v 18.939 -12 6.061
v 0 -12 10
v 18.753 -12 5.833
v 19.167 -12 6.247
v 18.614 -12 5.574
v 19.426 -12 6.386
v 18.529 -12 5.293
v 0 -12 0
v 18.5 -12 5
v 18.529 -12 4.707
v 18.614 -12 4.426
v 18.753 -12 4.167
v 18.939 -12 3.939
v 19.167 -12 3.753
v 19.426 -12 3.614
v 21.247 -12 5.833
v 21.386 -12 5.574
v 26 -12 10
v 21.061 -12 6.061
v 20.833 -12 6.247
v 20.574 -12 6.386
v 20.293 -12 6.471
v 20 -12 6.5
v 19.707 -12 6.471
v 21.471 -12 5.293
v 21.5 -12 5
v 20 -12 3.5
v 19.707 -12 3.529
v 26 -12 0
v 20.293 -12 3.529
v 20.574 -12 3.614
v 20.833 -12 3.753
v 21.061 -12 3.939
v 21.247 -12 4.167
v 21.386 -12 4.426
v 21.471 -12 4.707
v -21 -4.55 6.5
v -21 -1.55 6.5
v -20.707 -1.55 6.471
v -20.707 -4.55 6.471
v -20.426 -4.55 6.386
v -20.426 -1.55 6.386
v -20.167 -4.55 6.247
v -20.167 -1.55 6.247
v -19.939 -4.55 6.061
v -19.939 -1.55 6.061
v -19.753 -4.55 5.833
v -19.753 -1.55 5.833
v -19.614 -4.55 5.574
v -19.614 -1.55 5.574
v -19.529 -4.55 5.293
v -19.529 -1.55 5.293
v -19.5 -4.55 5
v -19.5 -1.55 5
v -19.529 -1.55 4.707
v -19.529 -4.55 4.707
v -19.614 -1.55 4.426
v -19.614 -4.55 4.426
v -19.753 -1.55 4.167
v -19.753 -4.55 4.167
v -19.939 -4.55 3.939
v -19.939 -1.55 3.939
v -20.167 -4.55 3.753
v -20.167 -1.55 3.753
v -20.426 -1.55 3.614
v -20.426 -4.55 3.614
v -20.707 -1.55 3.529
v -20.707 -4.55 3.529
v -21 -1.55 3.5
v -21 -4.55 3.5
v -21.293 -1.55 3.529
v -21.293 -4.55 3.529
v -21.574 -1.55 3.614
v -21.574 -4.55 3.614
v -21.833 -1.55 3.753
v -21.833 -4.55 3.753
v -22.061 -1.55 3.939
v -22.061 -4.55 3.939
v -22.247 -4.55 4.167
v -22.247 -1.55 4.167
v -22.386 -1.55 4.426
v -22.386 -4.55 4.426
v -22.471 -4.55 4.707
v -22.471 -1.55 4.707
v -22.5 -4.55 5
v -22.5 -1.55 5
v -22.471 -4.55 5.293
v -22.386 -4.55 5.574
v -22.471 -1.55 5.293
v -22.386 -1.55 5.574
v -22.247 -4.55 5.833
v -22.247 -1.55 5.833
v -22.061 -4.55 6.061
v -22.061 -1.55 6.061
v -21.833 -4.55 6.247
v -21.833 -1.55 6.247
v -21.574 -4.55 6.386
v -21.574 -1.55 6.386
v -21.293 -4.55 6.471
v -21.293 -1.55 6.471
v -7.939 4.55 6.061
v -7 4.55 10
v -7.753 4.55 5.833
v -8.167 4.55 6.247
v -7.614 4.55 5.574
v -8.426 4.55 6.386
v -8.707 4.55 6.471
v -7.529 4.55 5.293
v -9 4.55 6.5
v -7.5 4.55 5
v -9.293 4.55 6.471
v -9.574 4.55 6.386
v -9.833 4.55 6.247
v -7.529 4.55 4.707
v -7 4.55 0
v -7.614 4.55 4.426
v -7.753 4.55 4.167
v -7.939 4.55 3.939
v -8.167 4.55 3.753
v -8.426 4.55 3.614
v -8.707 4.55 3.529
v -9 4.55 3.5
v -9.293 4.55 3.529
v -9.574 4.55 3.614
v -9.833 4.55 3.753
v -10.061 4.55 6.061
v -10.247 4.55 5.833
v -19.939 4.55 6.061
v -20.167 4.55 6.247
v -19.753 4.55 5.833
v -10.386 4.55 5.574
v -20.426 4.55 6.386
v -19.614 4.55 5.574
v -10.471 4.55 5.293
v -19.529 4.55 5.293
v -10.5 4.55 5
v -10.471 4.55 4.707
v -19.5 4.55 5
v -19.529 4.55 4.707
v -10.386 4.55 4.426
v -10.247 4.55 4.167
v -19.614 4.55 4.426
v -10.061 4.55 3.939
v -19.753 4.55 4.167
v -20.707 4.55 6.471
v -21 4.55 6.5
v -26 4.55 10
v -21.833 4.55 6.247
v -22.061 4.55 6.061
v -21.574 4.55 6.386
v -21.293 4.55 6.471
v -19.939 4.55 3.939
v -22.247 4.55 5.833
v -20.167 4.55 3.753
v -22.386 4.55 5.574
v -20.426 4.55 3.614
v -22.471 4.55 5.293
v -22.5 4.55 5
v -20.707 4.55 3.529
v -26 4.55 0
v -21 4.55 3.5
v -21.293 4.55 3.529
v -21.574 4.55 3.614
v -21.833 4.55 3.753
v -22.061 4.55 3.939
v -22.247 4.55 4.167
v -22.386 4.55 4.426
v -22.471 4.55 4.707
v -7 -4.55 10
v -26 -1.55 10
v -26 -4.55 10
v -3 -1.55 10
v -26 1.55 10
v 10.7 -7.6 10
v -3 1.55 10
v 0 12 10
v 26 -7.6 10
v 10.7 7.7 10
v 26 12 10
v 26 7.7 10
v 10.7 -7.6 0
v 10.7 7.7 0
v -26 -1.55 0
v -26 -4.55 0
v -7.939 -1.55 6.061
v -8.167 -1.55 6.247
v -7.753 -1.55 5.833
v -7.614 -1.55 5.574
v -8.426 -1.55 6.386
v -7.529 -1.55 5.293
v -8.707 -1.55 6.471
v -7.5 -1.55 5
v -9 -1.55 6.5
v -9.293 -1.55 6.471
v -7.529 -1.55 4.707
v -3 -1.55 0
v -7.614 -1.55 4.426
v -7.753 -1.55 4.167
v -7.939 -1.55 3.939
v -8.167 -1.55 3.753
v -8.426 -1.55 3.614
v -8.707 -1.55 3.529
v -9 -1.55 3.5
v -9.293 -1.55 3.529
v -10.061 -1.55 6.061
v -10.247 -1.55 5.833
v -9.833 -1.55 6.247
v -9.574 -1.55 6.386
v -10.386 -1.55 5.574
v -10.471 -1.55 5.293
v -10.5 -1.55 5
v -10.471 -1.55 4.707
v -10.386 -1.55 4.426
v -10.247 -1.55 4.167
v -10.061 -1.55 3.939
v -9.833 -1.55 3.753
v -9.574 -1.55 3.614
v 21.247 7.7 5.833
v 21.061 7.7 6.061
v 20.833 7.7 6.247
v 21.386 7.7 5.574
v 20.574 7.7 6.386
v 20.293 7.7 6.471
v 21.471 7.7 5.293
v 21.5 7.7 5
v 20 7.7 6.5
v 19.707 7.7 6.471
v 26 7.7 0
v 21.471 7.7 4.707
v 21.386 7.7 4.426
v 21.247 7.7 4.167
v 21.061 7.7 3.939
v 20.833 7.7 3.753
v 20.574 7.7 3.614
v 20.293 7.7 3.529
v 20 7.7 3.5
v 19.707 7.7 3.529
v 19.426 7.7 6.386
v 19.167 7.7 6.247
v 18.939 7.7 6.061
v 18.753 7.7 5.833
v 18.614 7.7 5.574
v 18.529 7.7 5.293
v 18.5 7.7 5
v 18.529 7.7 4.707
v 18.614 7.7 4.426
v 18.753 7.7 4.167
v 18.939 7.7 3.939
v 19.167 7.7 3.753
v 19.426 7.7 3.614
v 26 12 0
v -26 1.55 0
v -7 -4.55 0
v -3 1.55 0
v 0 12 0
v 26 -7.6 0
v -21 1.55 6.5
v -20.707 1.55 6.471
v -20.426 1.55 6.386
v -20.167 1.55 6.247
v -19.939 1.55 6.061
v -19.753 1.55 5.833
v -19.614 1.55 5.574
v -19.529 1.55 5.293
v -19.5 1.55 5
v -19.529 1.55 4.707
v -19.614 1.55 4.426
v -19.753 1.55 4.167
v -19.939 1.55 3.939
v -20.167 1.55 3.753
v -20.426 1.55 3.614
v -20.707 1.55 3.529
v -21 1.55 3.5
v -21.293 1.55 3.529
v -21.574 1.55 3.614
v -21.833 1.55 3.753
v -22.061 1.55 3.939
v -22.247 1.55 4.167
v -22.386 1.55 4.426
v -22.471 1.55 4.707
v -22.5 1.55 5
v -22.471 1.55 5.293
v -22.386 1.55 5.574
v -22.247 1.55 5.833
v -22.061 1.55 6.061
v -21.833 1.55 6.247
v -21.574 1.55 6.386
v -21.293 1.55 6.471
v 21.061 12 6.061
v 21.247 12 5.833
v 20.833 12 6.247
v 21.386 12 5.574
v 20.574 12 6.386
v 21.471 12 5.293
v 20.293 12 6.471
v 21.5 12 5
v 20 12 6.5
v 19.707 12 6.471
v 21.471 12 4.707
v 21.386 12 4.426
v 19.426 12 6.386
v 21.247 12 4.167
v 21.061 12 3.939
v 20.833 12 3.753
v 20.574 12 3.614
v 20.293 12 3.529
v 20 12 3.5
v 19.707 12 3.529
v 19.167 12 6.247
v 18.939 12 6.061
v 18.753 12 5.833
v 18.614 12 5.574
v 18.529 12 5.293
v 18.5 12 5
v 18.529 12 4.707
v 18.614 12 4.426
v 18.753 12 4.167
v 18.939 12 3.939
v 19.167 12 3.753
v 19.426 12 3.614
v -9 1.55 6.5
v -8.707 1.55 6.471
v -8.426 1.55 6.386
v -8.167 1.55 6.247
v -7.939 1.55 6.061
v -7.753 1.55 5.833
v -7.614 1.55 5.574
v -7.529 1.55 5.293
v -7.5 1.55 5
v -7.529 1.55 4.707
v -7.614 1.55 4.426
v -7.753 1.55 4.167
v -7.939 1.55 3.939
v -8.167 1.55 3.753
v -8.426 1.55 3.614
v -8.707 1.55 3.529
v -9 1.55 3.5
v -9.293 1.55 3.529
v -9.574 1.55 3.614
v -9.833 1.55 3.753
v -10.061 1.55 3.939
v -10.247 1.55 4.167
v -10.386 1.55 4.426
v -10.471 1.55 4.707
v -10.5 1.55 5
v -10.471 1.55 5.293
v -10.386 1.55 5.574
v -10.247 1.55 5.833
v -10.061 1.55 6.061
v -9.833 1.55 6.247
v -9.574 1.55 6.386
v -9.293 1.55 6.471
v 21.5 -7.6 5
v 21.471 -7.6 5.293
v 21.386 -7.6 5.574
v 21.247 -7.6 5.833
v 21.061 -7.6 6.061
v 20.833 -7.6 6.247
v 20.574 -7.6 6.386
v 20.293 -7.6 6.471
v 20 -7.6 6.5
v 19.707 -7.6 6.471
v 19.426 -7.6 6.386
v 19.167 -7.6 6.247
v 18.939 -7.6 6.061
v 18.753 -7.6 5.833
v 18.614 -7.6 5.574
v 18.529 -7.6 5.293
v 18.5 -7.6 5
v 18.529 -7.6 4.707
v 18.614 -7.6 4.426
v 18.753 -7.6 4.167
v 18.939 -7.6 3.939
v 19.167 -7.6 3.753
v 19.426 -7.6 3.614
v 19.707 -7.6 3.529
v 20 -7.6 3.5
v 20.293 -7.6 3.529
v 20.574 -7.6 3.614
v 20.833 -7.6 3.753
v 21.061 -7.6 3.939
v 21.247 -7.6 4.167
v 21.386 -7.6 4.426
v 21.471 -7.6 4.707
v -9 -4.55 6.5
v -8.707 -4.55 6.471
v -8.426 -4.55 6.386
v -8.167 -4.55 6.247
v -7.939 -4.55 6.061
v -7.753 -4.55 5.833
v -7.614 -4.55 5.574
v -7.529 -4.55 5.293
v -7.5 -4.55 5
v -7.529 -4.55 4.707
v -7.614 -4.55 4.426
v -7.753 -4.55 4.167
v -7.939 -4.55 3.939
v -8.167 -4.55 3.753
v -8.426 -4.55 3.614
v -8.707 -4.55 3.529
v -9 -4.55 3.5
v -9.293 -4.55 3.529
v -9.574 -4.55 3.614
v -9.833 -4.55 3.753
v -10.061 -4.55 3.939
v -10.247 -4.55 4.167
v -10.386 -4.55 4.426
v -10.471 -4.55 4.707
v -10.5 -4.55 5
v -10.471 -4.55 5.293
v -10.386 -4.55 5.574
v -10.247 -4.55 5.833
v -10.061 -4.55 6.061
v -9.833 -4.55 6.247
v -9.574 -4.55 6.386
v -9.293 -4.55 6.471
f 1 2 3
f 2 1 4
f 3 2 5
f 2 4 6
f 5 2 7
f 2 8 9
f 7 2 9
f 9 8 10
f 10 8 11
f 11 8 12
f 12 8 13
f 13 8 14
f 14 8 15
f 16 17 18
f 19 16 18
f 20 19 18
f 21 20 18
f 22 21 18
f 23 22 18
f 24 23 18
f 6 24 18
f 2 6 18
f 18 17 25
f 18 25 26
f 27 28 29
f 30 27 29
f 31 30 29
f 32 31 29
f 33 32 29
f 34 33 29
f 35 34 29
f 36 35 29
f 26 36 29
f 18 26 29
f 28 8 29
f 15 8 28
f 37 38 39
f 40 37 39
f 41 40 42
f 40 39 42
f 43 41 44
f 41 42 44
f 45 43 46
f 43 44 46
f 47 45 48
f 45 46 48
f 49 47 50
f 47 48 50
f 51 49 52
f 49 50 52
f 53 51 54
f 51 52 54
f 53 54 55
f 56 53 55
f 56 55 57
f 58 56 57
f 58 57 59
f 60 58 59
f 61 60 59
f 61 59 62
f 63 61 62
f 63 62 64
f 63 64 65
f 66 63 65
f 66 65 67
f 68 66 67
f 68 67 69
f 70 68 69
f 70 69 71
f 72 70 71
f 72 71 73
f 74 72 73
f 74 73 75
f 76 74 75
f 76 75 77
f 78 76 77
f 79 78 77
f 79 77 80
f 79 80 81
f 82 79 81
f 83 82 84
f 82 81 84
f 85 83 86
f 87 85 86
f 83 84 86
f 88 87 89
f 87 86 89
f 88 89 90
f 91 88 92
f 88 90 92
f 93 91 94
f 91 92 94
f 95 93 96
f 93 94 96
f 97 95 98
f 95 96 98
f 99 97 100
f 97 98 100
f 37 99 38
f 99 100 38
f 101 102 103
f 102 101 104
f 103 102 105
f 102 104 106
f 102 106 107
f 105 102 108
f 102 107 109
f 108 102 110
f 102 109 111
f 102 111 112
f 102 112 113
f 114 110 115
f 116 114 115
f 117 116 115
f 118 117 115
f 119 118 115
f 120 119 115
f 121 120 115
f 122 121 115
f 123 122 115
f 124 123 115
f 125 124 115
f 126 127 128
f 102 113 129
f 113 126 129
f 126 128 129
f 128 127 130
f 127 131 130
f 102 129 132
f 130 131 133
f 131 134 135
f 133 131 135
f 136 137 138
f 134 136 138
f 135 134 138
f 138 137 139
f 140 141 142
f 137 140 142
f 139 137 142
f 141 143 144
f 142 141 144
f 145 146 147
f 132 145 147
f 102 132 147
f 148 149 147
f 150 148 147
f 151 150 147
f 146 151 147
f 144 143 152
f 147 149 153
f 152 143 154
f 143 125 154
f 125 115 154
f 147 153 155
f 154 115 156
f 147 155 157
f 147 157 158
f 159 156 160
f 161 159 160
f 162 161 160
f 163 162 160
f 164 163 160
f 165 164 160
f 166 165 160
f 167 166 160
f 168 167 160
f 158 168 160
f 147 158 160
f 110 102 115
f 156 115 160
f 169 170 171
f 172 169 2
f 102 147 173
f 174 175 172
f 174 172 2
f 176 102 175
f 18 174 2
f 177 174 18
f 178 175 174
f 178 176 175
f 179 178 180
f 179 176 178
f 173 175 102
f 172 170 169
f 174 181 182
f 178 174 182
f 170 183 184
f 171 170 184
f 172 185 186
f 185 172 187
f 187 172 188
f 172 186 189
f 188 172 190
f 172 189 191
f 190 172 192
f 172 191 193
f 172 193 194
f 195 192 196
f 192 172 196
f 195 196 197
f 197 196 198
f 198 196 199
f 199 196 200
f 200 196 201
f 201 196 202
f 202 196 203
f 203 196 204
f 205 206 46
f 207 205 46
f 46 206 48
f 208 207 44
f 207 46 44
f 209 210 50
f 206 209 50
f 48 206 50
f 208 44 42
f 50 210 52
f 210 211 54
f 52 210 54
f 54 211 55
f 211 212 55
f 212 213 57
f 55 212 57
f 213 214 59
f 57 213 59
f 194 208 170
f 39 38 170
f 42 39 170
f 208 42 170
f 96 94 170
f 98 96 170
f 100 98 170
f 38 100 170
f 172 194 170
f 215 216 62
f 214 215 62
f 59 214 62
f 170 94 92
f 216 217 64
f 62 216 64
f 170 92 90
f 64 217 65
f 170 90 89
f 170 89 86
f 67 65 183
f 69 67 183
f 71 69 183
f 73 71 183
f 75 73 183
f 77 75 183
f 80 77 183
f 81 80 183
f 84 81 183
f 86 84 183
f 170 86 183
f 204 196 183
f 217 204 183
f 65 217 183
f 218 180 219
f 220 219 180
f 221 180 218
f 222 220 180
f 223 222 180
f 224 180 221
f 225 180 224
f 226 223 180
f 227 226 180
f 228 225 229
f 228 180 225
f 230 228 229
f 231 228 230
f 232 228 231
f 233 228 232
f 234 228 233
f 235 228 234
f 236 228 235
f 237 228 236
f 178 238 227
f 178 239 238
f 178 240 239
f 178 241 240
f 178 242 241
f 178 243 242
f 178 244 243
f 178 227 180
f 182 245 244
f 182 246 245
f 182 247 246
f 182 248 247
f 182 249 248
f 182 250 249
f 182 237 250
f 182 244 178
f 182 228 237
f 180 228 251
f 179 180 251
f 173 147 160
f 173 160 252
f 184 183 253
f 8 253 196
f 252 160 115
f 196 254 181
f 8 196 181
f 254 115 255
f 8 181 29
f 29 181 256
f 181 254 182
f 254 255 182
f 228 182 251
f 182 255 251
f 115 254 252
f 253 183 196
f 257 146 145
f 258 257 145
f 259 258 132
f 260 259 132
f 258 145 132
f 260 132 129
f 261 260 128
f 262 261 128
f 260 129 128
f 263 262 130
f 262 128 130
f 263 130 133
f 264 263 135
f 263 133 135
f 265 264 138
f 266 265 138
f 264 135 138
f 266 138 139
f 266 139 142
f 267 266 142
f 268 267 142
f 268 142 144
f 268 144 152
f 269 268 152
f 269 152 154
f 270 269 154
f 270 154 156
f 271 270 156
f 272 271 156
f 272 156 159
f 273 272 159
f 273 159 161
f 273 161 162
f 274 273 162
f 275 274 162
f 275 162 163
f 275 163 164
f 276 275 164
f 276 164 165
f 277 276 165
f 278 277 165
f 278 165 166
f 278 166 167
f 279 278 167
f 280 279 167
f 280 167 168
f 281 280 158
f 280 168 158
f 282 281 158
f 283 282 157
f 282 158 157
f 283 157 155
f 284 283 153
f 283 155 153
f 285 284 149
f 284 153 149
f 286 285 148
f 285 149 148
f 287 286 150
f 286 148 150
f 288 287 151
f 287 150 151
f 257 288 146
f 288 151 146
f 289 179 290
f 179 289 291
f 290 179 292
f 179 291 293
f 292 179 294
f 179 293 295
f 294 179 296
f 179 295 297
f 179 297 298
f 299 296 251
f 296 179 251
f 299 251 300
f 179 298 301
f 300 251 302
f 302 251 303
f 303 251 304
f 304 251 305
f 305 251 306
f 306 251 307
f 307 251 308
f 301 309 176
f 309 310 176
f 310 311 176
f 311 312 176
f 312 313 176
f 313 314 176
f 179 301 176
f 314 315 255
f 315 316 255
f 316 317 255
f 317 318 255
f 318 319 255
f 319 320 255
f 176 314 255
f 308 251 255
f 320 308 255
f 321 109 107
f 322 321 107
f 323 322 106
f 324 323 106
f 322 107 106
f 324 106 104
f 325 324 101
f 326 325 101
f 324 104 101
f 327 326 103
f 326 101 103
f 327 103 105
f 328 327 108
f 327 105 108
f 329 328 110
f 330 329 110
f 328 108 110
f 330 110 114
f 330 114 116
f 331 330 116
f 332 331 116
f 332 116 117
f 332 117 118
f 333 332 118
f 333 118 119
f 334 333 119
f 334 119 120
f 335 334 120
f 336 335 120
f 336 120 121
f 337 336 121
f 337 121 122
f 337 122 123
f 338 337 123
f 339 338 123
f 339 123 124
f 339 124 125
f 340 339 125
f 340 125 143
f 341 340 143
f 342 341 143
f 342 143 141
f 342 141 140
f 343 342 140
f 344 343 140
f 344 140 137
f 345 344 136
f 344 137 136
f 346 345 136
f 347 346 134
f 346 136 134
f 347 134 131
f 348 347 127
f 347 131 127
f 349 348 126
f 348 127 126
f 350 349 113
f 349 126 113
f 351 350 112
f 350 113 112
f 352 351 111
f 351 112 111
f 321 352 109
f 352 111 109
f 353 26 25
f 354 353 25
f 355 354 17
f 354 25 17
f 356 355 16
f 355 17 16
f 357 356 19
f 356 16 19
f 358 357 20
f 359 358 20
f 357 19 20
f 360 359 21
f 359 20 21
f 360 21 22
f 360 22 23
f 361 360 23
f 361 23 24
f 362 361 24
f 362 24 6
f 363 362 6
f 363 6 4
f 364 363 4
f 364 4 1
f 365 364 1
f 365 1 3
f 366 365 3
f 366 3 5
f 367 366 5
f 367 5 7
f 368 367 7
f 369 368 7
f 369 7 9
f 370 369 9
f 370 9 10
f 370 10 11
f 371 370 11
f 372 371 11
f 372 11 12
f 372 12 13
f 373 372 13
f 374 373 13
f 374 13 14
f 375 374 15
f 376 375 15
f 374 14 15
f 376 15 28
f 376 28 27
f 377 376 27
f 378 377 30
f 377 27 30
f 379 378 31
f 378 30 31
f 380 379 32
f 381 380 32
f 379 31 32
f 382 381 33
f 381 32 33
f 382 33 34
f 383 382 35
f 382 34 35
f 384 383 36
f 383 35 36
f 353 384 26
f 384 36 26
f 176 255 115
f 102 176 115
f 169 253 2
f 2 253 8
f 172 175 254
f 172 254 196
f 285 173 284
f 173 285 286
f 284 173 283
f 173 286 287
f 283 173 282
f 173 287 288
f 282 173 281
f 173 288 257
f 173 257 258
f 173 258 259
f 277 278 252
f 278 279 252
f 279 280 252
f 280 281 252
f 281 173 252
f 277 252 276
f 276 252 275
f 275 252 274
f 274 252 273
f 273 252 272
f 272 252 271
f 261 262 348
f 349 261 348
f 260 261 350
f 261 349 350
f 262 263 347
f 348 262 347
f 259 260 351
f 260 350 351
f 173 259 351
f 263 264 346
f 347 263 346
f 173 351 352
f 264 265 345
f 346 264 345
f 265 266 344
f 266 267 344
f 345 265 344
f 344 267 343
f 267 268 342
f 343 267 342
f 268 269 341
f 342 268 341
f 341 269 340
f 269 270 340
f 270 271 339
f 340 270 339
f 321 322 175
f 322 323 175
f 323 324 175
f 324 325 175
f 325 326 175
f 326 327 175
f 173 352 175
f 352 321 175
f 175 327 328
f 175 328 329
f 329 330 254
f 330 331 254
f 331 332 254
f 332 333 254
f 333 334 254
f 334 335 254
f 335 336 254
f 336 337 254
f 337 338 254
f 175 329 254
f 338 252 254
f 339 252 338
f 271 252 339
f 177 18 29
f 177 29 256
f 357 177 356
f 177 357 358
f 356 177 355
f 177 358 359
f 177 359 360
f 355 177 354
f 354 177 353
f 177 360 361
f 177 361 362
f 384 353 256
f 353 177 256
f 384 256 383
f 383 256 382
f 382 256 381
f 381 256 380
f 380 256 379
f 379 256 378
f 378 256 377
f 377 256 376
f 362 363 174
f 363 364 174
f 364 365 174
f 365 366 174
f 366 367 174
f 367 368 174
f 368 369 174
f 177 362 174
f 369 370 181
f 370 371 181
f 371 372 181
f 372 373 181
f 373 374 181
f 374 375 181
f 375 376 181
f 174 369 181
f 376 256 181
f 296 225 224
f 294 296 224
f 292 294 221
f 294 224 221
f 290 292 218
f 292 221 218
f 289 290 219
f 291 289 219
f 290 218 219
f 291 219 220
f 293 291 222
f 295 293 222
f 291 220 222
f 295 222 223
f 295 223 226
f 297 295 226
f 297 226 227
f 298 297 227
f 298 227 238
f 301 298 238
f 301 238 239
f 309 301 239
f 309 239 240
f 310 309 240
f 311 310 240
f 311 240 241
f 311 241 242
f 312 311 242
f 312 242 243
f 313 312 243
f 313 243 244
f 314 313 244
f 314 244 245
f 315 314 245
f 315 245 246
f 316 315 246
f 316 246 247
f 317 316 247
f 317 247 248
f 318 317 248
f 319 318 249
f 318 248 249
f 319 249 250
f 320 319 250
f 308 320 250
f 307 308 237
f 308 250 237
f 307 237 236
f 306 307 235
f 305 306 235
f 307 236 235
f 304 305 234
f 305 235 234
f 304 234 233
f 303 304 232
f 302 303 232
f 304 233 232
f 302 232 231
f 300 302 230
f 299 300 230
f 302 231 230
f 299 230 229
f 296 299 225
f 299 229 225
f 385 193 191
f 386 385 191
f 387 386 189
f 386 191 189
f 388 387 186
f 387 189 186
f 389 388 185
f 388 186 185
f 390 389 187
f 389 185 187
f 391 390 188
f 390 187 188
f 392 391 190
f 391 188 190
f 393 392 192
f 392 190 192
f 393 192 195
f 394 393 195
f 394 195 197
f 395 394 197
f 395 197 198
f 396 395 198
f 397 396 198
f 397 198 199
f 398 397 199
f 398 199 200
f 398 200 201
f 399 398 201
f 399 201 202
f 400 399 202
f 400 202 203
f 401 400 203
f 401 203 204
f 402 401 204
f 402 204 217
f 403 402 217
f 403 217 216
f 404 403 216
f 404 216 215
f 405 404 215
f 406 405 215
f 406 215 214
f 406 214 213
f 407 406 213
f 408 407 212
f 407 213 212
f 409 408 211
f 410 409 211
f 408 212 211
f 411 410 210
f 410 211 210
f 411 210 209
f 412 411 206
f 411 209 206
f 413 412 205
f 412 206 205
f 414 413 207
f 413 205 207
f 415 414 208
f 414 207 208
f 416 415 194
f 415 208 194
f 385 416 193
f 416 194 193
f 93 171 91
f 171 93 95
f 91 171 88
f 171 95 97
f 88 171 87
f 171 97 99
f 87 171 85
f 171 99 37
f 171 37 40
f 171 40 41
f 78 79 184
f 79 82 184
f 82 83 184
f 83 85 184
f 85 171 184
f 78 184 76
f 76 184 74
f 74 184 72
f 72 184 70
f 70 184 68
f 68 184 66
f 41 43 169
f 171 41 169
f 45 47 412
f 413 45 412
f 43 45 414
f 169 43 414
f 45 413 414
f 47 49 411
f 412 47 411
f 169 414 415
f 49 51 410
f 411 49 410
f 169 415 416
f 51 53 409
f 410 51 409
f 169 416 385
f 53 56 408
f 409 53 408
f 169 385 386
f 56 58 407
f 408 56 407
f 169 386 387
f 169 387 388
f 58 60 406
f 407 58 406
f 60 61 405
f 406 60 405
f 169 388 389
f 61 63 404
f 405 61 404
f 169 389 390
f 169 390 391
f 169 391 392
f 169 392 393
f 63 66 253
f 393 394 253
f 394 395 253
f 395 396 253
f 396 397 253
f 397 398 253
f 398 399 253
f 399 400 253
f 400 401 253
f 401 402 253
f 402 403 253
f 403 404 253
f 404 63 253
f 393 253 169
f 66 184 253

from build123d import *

# Parameters (mm, degrees)
EXTRUDE_1_DEPTH     = 10
CUT_EXTRUDE_5_REACH = 34.402
SKETCH_7_R          = 1.5
SKETCH_8_W          = 15.3
SKETCH_8_H          = 15.3
CUT_EXTRUDE_6_DEPTH = 10
SKETCH_11_R         = 1.5
CUT_EXTRUDE_8_DEPTH = 37.769552622


with BuildPart() as part:
    # 草图1 → 凸台-拉伸1 (new body)
    with BuildSketch(Plane.XY):
        Polygon((-26, 4.55), (-26, 1.55), (-3, 1.55), (-3, -1.55), (-26, -1.55), (-26, -4.55), (-7, -4.55), (0, -12), (26, -12), (26, 12), (0, 12), (-7, 4.55), align=None)
    extrude(amount=EXTRUDE_1_DEPTH)

    # 切除-拉伸5: up to this face of the body (flat: up to its plane)
    cut_extrude_5_end = Plane(part.part.faces().sort_by_distance((-16.5, -4.55, 5))[0])
    # 草图7 → 切除-拉伸5 (cut, up to the picked face)
    with BuildSketch(Plane(origin=(0, 4.55, 0), x_dir=(1, 0, 0), z_dir=(0, 1, 0)), mode=Mode.PRIVATE) as cut_extrude_5_sk1:
        with Locations(Location((-21, -5, 0), (0, 0, 270))):
            Circle(SKETCH_7_R)
    cut_extrude_5_tool1 = split(extrude(cut_extrude_5_sk1.sketch, amount=-CUT_EXTRUDE_5_REACH, mode=Mode.PRIVATE), bisect_by=cut_extrude_5_end, keep=Keep.BOTH, mode=Mode.PRIVATE)
    # 草图7 → 切除-拉伸5 (cut, up to the picked face)
    with BuildSketch(Plane(origin=(0, 4.55, 0), x_dir=(1, 0, 0), z_dir=(0, 1, 0)), mode=Mode.PRIVATE) as cut_extrude_5_sk2:
        with Locations(Location((-9, -5, 0), (0, 0, 270))):
            Circle(SKETCH_7_R)
    cut_extrude_5_tool2 = split(extrude(cut_extrude_5_sk2.sketch, amount=-CUT_EXTRUDE_5_REACH, mode=Mode.PRIVATE), bisect_by=cut_extrude_5_end, keep=Keep.BOTH, mode=Mode.PRIVATE)
    add(cut_extrude_5_tool1.solids().sort_by(Axis((-21, 4.55, 5), (0, -1, 0)))[0], mode=Mode.SUBTRACT)
    add(cut_extrude_5_tool2.solids().sort_by(Axis((-9, 4.55, 5), (0, -1, 0)))[0], mode=Mode.SUBTRACT)

    # 草图8 → 切除-拉伸6 (cut)
    with BuildSketch(Plane(origin=(0, 0, 0), x_dir=(-1, 0, 0), z_dir=(0, 0, -1))):
        with Locations((-18.35, 0.05)):
            Rectangle(SKETCH_8_W, SKETCH_8_H)
    extrude(amount=-CUT_EXTRUDE_6_DEPTH, mode=Mode.SUBTRACT)

    # 草图11 → 切除-拉伸8 (cut, through all)
    with BuildSketch(Plane.XZ.offset(12)):
        with Locations((20, 5)):
            Circle(SKETCH_11_R)
    extrude(amount=-CUT_EXTRUDE_8_DEPTH, mode=Mode.SUBTRACT)


solid = part.part
